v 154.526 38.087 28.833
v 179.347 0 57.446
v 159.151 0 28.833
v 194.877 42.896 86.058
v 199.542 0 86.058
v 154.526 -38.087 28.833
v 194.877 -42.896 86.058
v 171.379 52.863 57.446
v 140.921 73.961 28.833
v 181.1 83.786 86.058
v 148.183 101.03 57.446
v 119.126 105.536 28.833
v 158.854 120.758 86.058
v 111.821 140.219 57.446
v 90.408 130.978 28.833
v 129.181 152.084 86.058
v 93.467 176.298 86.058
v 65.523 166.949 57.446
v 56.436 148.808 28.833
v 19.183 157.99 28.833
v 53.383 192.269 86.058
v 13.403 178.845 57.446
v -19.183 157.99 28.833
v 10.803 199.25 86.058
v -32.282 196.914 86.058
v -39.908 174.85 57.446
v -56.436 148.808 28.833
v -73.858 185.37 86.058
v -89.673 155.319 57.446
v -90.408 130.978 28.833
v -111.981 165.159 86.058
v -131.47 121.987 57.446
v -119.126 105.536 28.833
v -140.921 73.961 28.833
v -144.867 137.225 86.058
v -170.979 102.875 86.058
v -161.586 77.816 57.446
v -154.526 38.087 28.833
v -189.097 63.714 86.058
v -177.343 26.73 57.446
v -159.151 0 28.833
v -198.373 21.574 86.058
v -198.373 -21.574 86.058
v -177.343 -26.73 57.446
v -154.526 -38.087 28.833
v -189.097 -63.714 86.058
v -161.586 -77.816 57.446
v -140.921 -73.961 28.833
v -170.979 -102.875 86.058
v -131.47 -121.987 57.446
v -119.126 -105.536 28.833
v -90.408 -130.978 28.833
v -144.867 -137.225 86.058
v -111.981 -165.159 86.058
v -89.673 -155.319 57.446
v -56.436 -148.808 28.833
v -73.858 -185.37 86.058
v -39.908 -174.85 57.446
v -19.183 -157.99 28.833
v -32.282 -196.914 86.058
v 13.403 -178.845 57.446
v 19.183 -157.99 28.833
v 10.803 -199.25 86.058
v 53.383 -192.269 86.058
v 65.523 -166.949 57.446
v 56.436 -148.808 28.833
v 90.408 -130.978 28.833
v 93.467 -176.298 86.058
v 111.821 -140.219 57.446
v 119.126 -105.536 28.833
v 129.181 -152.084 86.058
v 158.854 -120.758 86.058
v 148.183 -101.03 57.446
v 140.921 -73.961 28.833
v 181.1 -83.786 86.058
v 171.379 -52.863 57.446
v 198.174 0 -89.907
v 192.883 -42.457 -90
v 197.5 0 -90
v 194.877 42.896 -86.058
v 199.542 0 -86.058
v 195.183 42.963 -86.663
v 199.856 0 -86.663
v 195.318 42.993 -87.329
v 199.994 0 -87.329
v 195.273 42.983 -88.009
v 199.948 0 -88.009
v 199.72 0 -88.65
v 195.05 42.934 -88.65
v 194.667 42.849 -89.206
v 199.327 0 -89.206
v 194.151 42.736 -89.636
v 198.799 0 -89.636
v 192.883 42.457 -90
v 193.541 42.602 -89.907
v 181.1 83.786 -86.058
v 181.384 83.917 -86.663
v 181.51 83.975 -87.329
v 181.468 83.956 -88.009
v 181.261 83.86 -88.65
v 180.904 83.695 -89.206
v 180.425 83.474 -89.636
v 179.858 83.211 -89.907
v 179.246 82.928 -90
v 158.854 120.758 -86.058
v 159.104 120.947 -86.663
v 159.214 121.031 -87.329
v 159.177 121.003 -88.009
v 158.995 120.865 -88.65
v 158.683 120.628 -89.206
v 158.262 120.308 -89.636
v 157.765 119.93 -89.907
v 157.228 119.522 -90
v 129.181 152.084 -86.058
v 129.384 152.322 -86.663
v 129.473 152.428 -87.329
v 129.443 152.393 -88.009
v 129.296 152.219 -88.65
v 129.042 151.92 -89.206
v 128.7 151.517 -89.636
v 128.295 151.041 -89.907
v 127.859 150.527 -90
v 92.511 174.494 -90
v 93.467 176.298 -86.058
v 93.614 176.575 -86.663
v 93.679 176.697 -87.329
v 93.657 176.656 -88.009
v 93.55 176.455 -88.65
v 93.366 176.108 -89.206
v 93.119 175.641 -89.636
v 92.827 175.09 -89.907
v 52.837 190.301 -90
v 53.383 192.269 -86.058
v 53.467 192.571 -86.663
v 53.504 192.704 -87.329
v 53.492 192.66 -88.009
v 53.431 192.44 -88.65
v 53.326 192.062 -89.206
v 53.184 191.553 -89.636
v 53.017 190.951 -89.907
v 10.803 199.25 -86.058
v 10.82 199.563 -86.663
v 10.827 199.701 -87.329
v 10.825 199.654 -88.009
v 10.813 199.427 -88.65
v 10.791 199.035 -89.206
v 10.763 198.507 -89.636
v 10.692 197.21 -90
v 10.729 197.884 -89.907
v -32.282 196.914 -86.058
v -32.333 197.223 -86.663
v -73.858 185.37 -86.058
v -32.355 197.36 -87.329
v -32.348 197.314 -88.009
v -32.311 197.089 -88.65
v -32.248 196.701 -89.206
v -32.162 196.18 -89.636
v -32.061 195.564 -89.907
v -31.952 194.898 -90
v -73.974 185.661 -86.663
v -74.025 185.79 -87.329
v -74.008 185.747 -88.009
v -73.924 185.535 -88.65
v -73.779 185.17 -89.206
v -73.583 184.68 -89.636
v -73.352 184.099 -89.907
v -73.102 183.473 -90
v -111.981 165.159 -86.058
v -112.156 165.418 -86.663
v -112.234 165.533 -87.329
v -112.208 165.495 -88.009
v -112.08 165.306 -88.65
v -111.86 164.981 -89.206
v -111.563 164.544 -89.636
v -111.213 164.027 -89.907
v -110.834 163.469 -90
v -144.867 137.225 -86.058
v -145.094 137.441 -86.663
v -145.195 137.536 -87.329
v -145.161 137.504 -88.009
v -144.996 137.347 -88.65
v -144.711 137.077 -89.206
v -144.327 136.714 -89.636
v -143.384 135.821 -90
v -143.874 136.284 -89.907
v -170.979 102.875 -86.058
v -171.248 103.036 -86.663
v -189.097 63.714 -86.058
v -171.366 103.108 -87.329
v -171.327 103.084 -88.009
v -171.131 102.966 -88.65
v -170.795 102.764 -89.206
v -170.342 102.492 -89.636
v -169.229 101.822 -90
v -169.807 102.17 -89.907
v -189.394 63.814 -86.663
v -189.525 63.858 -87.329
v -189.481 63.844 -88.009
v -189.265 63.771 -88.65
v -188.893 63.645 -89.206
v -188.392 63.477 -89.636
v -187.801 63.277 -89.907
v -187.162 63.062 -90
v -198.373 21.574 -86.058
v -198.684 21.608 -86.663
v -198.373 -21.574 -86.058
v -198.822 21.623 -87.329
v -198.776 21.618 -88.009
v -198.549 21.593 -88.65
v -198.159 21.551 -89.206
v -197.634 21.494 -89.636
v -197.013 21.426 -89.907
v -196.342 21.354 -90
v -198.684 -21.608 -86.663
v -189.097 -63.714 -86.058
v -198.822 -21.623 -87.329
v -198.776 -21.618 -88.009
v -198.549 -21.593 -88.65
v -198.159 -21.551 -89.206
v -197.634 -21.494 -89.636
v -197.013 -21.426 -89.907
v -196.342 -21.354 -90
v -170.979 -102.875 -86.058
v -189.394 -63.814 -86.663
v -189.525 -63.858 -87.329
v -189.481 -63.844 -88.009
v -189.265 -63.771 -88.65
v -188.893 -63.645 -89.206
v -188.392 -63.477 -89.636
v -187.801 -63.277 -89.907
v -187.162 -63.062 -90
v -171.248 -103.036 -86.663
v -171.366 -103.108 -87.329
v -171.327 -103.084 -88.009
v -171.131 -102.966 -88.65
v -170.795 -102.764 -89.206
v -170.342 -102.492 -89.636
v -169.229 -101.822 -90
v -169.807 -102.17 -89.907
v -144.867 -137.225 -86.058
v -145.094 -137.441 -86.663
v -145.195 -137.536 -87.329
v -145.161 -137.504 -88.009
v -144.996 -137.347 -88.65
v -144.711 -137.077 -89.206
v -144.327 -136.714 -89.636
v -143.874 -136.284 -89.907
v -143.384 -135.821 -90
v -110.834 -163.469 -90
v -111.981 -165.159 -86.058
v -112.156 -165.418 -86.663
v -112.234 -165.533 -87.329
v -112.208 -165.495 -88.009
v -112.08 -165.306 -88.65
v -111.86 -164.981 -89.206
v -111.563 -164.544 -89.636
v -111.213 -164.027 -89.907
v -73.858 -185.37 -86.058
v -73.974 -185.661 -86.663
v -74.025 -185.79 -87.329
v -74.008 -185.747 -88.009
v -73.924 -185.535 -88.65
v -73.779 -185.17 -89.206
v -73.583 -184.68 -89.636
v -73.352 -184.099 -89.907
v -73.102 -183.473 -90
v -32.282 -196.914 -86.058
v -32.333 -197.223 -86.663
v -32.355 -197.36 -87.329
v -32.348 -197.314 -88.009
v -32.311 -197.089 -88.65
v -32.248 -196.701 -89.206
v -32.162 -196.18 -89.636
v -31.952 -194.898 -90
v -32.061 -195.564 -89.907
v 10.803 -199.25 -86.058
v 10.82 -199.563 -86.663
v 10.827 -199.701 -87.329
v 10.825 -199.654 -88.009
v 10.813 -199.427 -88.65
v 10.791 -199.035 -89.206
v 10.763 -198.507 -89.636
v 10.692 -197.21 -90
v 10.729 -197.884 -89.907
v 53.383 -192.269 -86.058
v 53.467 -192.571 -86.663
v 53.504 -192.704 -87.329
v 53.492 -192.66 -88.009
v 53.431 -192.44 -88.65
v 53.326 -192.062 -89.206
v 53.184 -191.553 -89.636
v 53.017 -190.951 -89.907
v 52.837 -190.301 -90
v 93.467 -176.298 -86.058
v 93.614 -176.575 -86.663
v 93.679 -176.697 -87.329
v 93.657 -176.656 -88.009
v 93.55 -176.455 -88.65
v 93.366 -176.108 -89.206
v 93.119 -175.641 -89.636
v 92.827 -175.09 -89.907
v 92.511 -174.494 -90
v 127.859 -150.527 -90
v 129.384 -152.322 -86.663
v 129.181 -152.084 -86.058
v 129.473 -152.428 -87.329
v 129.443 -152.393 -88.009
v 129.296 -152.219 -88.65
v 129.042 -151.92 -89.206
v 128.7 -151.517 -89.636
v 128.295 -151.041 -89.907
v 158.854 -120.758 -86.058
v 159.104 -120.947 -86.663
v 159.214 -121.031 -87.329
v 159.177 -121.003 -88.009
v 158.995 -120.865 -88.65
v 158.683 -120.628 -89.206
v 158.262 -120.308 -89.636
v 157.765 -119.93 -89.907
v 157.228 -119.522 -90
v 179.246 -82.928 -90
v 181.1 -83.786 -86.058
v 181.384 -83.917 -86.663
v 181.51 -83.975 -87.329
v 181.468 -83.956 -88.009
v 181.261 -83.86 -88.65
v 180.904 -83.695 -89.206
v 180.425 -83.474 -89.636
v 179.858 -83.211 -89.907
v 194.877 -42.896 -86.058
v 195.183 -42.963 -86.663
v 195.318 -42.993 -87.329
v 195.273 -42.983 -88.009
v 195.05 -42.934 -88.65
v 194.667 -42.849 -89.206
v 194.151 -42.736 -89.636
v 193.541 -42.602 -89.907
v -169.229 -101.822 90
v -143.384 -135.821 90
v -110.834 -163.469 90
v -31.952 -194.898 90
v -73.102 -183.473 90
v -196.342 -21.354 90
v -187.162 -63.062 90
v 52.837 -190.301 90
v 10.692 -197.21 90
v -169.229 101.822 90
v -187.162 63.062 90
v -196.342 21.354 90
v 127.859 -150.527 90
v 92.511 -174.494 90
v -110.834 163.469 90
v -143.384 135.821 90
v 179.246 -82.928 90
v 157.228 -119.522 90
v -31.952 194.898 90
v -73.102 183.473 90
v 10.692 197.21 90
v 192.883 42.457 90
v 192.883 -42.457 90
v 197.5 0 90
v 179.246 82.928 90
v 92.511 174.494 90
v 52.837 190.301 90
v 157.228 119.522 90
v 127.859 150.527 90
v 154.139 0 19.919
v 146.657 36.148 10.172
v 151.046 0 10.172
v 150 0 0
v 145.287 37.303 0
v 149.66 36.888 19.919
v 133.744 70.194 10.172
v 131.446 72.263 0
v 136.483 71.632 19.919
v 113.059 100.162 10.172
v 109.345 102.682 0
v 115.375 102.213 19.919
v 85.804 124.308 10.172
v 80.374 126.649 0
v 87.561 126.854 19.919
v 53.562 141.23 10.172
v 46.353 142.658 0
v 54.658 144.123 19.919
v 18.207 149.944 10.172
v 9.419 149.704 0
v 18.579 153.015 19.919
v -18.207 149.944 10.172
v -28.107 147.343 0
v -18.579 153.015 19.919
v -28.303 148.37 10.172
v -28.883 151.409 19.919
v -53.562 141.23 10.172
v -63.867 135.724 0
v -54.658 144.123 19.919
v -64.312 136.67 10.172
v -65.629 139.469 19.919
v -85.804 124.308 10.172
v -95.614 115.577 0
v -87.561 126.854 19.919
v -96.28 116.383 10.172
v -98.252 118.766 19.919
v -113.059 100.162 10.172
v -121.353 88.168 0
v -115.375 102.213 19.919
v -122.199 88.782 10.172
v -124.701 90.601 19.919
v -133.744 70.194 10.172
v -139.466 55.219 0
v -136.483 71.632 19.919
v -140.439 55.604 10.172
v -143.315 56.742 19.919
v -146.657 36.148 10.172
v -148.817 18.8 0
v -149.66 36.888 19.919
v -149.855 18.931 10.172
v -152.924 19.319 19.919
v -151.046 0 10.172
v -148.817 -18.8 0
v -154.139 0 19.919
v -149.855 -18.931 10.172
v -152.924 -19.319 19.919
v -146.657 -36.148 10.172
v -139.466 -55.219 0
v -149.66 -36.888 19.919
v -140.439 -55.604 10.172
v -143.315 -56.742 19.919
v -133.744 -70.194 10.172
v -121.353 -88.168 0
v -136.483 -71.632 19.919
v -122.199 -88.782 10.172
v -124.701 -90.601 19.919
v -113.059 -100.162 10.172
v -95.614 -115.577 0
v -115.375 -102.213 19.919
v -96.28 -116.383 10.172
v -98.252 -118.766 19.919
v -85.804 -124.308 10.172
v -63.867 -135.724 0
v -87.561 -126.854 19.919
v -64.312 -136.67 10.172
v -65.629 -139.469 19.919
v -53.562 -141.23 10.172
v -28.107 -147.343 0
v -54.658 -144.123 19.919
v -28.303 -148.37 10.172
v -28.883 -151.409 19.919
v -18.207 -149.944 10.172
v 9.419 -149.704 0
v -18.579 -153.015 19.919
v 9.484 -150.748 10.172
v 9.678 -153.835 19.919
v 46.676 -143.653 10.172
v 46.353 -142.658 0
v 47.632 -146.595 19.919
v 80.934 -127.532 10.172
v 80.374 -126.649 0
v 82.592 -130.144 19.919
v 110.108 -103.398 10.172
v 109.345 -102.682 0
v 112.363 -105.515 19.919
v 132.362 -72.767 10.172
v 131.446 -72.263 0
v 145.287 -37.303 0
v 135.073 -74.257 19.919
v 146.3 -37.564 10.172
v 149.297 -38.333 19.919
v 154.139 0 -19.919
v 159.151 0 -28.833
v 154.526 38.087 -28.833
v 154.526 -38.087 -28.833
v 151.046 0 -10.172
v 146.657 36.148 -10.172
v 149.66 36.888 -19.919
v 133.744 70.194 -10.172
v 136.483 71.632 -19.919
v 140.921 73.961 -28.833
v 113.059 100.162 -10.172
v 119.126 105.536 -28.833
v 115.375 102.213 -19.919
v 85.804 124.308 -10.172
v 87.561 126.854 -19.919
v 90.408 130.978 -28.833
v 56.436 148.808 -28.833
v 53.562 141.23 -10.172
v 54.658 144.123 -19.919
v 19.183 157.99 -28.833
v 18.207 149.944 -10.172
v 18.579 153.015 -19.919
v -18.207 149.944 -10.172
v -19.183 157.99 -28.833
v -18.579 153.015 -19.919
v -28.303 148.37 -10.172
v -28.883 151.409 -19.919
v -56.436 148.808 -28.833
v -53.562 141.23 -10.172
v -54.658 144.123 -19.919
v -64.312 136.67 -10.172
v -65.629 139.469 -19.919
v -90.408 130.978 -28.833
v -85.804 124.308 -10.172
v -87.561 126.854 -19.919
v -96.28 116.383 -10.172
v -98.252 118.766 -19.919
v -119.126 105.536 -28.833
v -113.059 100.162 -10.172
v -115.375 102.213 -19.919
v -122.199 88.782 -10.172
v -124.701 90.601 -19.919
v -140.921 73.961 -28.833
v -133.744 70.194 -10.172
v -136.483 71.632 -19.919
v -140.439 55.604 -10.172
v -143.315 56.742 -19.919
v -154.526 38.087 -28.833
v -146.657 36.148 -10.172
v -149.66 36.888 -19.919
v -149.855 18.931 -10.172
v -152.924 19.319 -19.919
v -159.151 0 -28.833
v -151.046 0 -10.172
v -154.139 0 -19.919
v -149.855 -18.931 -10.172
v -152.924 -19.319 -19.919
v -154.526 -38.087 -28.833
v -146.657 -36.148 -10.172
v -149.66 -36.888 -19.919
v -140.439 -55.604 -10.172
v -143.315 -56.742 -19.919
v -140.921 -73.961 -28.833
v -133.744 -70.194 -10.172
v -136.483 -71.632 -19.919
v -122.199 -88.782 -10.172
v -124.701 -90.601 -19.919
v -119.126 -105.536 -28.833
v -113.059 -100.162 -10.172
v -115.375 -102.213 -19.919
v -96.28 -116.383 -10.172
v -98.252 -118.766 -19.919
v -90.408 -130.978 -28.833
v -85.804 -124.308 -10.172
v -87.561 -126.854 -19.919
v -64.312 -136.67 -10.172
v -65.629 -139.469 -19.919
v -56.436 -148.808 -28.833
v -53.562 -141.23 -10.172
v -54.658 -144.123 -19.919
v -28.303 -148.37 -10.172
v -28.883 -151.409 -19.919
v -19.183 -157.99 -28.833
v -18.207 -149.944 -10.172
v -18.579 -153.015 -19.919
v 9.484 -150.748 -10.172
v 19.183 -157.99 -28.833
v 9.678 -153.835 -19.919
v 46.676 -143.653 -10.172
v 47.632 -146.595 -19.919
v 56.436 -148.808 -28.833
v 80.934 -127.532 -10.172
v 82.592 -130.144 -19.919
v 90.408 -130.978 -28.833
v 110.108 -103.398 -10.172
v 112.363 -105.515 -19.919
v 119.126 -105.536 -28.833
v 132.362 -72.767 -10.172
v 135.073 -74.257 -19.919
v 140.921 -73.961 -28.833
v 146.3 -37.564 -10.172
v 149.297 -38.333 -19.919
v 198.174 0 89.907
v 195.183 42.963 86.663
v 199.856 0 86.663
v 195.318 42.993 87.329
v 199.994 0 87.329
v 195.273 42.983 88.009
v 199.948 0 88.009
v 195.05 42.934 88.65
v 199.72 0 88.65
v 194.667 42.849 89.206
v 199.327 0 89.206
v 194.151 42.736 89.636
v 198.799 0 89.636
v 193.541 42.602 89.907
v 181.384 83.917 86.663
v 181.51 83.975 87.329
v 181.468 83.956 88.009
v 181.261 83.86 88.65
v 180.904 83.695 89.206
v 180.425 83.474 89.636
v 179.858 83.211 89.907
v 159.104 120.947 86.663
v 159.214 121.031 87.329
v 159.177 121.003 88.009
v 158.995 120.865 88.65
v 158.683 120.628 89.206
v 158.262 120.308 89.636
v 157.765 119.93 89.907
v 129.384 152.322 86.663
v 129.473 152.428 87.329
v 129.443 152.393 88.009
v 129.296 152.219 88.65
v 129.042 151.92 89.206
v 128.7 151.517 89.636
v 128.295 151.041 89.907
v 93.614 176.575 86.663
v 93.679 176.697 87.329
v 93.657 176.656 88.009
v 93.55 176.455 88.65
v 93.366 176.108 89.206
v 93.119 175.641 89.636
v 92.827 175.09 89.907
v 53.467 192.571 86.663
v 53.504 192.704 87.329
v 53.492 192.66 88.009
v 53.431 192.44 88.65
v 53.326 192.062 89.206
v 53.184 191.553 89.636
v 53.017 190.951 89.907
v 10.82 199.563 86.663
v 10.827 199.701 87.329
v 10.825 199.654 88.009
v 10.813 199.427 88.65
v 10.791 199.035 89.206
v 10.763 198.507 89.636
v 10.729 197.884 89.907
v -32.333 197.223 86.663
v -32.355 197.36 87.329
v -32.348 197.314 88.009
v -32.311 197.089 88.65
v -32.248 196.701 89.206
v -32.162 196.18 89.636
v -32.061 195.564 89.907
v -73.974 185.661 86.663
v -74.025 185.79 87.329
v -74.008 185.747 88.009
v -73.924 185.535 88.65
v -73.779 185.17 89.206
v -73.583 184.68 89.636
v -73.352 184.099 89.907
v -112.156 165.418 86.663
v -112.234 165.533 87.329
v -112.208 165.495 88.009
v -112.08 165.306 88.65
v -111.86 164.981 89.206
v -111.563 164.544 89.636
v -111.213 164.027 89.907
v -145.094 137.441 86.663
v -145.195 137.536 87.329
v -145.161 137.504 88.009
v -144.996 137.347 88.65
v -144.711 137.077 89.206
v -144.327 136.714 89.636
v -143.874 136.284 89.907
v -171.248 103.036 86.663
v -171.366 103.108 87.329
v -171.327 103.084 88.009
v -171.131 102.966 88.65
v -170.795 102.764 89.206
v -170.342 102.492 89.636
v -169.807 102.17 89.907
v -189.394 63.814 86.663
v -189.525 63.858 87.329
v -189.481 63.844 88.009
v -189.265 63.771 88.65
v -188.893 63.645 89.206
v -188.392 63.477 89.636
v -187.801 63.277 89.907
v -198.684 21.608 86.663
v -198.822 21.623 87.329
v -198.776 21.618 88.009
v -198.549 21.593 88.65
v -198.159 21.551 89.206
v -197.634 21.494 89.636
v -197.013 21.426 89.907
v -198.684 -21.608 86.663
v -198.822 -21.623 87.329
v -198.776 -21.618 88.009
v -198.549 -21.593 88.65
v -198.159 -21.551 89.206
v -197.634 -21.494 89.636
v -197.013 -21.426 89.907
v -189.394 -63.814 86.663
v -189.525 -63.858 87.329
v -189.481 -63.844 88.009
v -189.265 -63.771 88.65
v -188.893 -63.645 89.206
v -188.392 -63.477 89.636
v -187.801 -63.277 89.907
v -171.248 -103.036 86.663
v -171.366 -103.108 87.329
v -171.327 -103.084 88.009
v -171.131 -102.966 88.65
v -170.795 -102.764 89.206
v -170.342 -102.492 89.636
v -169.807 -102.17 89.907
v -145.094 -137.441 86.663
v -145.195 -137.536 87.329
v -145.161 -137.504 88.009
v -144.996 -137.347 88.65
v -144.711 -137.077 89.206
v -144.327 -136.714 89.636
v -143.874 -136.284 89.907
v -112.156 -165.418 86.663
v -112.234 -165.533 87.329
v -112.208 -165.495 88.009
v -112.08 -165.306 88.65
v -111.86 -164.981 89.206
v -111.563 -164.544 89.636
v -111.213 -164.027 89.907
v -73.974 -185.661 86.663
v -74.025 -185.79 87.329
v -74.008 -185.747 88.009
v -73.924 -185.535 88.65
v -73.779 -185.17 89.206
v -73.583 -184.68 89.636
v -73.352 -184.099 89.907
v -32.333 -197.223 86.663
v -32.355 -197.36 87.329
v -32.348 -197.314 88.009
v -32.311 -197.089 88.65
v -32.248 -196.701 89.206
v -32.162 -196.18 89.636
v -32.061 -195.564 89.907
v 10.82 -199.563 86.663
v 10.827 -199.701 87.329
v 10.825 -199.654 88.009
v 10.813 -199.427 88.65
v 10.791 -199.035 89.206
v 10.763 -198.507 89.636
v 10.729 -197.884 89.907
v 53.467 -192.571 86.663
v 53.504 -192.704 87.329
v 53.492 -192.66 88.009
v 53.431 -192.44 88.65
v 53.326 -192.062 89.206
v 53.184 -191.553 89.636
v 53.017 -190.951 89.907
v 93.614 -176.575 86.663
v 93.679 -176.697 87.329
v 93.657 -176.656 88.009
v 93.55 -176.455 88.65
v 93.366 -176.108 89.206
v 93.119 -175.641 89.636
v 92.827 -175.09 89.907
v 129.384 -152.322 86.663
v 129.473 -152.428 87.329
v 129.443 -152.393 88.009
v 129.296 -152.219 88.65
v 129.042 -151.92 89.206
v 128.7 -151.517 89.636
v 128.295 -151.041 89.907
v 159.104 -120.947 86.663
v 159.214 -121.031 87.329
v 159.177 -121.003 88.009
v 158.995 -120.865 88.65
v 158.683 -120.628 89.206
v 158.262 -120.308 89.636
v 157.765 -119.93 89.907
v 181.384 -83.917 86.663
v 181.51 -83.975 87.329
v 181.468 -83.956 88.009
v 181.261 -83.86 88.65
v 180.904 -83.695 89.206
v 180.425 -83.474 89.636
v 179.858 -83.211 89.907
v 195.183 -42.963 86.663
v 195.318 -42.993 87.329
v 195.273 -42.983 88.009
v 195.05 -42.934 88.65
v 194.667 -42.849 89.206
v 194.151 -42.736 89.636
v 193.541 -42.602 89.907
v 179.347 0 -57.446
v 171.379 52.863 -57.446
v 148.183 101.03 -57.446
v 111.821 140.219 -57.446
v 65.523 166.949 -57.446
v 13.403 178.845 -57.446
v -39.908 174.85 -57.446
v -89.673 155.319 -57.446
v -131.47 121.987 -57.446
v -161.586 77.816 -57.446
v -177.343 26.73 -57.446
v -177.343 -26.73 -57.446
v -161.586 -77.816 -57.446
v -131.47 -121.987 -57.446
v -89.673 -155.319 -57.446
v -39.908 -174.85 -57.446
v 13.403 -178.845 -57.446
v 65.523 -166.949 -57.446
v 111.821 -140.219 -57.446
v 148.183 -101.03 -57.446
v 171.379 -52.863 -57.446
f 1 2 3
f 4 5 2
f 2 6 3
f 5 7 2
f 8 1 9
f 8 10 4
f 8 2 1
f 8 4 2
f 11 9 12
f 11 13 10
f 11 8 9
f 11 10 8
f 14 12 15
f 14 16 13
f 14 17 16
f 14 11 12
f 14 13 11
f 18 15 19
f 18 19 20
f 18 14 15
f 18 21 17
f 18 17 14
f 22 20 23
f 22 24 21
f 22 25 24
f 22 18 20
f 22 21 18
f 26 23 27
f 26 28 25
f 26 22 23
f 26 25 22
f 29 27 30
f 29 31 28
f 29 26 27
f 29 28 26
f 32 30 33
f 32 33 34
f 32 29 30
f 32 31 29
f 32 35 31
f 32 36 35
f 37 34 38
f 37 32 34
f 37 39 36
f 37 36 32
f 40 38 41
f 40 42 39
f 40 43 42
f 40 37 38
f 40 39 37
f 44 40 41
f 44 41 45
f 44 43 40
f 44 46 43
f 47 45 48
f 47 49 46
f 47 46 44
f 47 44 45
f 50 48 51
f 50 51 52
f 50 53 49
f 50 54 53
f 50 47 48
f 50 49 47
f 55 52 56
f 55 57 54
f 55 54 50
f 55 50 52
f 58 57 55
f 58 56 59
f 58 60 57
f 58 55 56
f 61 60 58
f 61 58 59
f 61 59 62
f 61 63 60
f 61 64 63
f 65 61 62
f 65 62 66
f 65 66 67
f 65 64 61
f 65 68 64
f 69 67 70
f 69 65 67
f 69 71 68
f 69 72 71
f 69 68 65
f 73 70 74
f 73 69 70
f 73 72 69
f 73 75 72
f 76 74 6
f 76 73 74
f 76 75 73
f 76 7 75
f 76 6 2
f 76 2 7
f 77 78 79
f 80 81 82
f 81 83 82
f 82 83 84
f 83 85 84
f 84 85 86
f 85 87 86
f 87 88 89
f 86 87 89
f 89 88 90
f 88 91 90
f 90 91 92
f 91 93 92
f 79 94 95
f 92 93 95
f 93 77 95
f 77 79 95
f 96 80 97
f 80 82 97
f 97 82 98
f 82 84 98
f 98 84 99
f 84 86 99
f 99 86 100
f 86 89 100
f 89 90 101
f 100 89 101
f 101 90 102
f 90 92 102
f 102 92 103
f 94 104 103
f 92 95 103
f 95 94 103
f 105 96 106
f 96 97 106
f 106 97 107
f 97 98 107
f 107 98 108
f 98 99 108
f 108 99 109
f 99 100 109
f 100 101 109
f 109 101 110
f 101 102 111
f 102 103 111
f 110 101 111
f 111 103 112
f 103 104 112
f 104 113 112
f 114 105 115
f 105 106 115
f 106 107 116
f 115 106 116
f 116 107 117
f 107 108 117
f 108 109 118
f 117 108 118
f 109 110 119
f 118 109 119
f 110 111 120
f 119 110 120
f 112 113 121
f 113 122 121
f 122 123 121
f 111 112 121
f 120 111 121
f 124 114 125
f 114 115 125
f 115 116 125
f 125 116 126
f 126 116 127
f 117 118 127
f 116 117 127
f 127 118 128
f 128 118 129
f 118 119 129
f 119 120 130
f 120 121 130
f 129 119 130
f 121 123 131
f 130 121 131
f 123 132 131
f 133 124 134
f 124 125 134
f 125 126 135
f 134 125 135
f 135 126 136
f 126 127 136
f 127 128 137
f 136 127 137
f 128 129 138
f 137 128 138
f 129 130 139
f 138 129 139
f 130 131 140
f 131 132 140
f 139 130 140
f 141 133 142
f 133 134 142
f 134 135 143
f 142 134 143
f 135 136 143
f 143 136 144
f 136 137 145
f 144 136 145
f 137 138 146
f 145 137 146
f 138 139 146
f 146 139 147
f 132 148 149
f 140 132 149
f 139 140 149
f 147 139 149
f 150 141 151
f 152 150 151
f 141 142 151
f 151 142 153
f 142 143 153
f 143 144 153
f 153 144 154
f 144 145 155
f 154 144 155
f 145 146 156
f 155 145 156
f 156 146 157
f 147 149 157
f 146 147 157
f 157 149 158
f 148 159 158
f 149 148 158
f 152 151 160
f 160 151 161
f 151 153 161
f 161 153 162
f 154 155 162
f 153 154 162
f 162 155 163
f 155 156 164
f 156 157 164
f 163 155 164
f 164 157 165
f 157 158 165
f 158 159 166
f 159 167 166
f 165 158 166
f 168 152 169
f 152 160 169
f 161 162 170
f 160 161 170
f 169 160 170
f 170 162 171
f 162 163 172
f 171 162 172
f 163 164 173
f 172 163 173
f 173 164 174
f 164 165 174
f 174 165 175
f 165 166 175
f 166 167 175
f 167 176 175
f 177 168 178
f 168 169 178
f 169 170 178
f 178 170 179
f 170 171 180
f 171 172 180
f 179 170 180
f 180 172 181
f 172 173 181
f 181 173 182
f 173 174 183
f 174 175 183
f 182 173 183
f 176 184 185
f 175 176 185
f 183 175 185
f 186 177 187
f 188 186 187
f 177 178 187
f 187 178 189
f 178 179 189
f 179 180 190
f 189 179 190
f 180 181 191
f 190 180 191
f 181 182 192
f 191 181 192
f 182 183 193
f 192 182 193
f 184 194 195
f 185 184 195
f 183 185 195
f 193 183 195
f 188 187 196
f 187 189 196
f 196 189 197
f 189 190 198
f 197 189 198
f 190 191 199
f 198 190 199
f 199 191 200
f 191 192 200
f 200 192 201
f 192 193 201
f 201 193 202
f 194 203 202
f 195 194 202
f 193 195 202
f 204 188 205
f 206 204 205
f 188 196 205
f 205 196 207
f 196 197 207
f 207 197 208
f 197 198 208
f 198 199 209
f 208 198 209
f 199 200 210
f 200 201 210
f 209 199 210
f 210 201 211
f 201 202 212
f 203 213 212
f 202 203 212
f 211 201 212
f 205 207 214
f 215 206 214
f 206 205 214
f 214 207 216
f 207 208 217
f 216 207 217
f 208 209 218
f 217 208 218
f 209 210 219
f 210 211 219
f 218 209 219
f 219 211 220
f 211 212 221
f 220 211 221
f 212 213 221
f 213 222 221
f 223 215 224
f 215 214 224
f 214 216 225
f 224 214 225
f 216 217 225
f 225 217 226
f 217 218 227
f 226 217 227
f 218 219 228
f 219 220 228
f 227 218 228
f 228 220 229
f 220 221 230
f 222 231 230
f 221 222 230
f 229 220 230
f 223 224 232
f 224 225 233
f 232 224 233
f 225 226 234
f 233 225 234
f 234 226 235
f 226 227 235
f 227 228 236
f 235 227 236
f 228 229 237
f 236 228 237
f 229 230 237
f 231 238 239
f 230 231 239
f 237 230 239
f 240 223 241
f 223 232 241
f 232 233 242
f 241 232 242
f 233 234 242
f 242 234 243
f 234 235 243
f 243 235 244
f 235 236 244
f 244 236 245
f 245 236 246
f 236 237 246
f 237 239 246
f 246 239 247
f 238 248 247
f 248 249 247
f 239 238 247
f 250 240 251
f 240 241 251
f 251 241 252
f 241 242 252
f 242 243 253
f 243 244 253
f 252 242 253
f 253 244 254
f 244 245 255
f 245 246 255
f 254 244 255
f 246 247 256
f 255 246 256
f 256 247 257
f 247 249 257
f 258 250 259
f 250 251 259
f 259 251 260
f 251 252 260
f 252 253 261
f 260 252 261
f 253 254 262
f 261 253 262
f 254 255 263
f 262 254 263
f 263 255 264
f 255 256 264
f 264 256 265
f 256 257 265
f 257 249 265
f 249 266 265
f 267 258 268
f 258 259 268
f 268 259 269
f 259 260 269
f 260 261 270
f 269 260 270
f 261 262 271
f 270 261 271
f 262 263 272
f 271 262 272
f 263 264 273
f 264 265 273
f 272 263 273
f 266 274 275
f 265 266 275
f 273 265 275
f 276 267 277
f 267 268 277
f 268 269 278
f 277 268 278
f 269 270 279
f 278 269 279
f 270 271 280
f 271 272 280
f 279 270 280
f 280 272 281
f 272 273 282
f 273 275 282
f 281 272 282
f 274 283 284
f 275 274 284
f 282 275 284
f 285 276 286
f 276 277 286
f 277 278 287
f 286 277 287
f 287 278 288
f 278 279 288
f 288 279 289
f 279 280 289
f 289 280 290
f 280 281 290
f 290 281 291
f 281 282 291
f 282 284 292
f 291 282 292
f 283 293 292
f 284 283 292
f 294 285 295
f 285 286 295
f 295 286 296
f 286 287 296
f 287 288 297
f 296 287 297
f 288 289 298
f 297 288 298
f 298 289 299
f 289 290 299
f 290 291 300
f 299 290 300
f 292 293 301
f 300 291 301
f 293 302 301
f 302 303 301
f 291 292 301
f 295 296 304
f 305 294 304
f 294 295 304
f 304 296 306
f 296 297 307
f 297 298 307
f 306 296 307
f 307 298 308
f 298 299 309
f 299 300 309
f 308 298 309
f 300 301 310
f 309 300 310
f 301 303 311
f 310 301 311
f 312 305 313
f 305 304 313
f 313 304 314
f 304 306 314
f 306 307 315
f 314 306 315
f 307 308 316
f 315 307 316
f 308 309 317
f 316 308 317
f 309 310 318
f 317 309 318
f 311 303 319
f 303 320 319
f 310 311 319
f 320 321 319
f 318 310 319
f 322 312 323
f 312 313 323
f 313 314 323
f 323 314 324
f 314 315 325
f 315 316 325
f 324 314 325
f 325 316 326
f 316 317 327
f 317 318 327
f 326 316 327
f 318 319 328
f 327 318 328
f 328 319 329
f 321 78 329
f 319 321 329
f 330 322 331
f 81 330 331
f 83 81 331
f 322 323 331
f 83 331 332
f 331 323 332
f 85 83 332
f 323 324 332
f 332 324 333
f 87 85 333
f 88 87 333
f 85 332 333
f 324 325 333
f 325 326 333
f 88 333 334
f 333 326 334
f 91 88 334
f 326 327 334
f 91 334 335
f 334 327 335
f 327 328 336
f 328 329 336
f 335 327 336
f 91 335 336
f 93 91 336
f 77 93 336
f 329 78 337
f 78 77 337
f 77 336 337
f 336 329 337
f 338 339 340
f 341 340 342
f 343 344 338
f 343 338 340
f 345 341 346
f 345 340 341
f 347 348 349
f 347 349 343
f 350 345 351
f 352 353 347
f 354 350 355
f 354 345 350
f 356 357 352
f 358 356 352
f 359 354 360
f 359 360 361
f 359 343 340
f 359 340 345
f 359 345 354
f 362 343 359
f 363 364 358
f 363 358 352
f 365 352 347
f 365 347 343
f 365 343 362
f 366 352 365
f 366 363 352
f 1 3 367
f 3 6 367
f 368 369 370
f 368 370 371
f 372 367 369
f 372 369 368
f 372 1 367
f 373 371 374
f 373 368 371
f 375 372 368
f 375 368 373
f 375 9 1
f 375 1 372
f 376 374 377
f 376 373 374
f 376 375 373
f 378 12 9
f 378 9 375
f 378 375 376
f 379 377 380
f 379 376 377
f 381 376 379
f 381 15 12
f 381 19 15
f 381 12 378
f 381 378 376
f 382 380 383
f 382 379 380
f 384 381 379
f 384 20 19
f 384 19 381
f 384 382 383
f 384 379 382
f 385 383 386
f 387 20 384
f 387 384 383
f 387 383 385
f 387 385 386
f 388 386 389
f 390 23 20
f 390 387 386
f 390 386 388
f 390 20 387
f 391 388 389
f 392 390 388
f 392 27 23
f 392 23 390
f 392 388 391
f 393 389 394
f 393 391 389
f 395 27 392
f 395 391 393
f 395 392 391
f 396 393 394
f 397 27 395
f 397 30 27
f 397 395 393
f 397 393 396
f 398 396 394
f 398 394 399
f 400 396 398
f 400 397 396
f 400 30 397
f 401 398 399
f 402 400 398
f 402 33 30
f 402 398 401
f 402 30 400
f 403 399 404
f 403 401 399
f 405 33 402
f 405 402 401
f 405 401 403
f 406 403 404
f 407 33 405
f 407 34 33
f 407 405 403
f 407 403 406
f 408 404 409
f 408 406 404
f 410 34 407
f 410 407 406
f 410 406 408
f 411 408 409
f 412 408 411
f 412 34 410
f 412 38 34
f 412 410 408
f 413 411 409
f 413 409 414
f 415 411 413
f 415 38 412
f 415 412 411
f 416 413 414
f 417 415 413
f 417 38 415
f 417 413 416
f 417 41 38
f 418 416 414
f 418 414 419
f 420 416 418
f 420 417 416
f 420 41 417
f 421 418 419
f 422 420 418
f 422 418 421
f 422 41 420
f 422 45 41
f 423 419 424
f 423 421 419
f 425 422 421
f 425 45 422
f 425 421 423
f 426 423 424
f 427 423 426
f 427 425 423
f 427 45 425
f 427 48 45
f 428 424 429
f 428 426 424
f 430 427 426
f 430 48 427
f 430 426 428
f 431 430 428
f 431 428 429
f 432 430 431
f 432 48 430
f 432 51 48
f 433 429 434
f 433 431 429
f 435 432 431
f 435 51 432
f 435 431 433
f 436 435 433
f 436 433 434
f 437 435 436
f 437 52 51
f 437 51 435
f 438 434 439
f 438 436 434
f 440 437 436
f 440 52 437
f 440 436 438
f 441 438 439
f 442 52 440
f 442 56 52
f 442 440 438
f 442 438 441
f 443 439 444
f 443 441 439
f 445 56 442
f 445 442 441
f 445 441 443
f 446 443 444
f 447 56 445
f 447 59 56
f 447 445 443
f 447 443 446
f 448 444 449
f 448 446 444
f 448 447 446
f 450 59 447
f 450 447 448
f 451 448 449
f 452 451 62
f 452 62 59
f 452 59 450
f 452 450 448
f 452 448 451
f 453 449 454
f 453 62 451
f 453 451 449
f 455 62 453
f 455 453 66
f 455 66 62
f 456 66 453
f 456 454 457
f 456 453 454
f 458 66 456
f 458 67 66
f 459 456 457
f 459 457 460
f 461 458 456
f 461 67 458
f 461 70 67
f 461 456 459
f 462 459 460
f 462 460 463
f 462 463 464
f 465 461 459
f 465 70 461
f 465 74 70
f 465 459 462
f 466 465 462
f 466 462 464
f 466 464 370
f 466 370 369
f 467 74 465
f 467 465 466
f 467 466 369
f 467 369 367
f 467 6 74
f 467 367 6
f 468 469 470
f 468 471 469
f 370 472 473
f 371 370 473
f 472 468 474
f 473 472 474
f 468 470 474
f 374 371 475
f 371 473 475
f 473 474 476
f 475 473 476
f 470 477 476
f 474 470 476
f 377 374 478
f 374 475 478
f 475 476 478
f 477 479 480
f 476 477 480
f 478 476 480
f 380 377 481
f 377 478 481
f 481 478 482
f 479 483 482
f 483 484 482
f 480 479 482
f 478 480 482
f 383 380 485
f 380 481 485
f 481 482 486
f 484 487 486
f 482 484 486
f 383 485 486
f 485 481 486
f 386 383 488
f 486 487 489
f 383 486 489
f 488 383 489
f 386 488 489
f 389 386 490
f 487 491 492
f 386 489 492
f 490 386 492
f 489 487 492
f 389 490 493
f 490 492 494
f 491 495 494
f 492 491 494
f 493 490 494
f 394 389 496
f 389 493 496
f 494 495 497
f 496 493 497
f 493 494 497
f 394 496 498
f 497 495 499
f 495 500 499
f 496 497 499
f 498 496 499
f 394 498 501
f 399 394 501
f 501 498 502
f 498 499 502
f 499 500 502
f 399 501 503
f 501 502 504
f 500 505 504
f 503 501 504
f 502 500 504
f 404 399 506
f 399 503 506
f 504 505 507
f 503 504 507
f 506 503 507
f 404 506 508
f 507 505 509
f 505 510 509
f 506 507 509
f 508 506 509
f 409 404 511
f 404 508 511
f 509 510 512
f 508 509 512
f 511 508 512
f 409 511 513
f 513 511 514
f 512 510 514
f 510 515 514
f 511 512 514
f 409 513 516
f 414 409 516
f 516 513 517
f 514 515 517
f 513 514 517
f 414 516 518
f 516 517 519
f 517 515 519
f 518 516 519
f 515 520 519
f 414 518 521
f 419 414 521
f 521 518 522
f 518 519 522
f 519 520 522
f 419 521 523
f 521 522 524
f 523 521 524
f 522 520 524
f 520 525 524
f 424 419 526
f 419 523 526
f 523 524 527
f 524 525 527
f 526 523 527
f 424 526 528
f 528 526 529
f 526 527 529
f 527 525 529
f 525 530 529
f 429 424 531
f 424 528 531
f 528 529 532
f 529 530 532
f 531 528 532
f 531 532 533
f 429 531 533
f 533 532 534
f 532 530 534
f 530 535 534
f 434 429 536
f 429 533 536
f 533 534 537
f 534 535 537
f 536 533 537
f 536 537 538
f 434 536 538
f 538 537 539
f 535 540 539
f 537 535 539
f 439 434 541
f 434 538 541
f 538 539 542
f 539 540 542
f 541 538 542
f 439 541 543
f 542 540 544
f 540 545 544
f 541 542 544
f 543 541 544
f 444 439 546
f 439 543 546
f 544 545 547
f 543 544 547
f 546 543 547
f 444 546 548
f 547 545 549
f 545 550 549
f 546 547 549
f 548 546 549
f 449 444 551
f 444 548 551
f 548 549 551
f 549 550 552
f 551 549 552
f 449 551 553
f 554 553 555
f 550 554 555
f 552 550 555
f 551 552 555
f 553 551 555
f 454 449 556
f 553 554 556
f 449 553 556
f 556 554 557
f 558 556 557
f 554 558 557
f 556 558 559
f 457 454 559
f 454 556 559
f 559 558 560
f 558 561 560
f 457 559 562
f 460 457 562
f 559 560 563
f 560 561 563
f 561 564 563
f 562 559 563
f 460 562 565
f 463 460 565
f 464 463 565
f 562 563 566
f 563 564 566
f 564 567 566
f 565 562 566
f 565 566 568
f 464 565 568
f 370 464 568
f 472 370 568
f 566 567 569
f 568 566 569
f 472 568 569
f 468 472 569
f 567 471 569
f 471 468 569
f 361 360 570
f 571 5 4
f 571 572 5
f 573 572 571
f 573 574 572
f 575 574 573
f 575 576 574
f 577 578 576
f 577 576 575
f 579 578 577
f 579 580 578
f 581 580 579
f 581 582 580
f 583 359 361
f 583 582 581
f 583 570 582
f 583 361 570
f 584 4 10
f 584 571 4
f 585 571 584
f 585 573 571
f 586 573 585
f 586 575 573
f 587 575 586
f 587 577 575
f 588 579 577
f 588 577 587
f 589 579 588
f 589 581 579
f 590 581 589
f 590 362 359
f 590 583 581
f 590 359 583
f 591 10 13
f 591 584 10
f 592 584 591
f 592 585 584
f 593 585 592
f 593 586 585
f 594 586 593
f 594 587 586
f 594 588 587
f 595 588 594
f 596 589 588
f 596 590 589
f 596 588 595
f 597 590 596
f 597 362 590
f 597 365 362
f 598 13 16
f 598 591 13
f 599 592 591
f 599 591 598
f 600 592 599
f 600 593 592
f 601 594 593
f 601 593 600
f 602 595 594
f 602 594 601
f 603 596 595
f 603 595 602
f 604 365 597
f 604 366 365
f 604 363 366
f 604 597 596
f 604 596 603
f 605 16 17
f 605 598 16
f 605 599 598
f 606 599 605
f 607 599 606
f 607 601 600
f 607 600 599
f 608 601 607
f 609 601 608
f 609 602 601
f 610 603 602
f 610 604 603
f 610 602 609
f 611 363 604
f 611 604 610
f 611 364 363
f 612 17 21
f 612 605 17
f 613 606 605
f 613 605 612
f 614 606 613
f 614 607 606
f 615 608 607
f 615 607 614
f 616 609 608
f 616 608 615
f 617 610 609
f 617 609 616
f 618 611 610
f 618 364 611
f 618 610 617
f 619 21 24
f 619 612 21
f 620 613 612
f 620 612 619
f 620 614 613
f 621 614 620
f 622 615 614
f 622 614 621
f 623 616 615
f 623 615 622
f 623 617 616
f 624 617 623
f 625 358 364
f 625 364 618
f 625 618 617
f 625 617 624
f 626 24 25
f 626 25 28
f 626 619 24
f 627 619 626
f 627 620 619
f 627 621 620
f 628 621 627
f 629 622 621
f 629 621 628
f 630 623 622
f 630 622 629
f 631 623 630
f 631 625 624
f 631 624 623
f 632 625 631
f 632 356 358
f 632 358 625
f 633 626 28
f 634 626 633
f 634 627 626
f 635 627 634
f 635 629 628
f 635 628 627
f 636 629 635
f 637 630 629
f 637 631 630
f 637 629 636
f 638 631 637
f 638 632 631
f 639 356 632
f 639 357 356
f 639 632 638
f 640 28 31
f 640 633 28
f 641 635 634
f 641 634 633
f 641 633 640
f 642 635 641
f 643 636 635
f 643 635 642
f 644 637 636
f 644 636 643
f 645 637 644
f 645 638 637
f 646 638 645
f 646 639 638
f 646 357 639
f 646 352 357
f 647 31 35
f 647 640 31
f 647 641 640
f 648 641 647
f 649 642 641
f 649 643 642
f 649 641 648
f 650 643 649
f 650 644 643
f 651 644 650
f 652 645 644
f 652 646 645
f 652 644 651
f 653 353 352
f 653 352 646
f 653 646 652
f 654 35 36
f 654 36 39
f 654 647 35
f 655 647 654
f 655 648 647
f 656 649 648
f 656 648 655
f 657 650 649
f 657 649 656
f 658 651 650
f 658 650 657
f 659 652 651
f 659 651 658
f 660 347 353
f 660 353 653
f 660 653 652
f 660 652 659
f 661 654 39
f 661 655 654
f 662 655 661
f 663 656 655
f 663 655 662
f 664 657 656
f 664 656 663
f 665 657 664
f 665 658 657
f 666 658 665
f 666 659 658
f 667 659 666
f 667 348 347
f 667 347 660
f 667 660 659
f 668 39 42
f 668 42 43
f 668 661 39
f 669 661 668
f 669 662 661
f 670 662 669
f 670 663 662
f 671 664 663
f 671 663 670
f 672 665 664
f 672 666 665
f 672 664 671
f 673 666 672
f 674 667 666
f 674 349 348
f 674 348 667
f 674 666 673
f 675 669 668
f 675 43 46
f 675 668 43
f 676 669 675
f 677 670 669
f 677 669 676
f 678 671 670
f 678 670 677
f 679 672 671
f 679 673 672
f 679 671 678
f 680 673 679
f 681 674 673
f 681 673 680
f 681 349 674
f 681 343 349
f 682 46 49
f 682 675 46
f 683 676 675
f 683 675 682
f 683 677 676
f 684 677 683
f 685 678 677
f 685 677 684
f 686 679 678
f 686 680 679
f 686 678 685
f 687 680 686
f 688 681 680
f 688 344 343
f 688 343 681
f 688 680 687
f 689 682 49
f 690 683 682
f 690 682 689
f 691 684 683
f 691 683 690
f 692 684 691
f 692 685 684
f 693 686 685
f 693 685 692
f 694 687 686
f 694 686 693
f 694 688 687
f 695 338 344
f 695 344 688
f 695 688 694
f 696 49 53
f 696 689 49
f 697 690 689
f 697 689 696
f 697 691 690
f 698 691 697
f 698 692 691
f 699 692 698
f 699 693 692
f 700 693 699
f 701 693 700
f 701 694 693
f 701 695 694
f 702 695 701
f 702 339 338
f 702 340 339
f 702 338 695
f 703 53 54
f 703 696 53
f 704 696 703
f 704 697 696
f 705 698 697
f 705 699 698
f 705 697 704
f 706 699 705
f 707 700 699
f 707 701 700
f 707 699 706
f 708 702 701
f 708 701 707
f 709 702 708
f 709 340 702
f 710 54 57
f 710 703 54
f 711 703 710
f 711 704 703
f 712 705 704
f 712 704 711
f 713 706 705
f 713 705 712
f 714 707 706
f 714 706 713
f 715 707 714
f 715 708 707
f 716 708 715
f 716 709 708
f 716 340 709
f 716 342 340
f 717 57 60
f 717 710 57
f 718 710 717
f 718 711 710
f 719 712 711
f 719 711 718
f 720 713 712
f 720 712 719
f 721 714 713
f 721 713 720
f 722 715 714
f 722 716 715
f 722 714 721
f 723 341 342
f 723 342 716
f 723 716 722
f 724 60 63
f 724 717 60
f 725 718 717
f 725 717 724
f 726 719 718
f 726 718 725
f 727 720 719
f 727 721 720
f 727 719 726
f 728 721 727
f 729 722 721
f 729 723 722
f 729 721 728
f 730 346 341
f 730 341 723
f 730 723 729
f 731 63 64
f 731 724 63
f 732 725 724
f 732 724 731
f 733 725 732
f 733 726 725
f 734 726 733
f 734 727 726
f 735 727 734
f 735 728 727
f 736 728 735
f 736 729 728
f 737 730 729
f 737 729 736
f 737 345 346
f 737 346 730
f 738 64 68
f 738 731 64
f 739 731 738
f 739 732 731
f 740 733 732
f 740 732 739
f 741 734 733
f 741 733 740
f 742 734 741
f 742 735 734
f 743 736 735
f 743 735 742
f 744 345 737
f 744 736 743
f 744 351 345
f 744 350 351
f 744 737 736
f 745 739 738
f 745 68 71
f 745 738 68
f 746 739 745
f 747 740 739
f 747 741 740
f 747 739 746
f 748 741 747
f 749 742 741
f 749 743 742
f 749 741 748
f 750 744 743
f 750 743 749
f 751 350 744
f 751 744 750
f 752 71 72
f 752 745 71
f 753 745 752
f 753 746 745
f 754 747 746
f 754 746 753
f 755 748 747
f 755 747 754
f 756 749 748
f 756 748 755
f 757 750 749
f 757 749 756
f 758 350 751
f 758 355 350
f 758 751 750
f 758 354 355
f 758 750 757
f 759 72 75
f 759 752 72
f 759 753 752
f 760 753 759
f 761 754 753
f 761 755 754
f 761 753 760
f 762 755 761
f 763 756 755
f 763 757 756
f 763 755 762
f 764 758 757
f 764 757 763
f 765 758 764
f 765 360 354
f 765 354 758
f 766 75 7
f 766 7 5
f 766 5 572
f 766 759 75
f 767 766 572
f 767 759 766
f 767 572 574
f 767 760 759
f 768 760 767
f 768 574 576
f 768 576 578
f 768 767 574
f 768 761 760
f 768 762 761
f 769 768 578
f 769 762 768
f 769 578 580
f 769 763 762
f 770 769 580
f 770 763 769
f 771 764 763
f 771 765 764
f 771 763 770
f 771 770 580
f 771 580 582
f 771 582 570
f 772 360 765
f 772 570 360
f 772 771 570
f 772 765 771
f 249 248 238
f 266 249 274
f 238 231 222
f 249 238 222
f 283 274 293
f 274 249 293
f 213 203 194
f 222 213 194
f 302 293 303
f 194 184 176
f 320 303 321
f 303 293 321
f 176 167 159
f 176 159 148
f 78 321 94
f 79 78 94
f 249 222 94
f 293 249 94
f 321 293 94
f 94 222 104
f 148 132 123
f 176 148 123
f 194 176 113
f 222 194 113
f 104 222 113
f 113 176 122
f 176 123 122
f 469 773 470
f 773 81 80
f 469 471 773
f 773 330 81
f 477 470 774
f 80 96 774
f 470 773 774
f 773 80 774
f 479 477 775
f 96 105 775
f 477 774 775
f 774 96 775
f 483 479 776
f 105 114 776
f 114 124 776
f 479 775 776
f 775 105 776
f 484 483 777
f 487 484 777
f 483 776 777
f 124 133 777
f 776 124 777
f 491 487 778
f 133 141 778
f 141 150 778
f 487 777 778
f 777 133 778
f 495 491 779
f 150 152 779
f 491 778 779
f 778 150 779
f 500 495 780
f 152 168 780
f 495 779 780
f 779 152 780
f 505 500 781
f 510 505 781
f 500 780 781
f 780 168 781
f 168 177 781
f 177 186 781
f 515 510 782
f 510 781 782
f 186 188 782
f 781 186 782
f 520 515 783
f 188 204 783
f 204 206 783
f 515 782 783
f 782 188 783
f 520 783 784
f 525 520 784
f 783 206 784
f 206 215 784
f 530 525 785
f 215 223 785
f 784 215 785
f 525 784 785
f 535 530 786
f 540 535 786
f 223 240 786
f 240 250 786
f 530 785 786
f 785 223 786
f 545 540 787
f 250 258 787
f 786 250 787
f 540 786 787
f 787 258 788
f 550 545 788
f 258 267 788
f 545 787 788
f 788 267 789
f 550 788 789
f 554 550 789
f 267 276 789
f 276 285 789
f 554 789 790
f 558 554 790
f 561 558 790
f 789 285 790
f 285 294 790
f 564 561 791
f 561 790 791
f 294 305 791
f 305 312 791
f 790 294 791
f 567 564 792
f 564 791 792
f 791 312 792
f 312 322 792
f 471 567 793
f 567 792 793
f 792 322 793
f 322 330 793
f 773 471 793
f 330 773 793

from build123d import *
from build123d import SkipClean  # not in build123d's __all__


# Not quite as in the source:
# - ends of sketch curves that miss each other by under 0.0002 mm in the source are joined


with BuildPart() as f1:
    # F0 (on Front) → F1 (revolve)
    with BuildSketch(Plane.XZ):
        with BuildLine():
            ThreePointArc((150, 0), (152.3425507406, 15.1250629778), (159.1507012033, 28.8328768565))
            Line((159.1507012033, 28.8328768565), (199.542465, 86.058356))
            ThreePointArc((199.542465, 86.058356), (199.7196970287, 88.6501935058), (197.5, 90))
            Line((197.5, 90), (0, 90))
            Line((0, 90), (0, 0))
            Line((0, 0), (150, 0))
        make_face()
    revolve(axis=Axis((0, 0, 45), (0, 0, 1)))

    # F2: F1 across face


with BuildPart() as f1_1:
    add(f1.part, clean=False)
    with SkipClean():  # cleaning this boolean's faces spoils the solid; the shape is the same uncleaned
        add(f1.part.mirror(Plane(origin=(0, 0, 0), x_dir=(1, 0, 0), z_dir=(0, 0, -1))), clean=False)


solid = f1_1.part
